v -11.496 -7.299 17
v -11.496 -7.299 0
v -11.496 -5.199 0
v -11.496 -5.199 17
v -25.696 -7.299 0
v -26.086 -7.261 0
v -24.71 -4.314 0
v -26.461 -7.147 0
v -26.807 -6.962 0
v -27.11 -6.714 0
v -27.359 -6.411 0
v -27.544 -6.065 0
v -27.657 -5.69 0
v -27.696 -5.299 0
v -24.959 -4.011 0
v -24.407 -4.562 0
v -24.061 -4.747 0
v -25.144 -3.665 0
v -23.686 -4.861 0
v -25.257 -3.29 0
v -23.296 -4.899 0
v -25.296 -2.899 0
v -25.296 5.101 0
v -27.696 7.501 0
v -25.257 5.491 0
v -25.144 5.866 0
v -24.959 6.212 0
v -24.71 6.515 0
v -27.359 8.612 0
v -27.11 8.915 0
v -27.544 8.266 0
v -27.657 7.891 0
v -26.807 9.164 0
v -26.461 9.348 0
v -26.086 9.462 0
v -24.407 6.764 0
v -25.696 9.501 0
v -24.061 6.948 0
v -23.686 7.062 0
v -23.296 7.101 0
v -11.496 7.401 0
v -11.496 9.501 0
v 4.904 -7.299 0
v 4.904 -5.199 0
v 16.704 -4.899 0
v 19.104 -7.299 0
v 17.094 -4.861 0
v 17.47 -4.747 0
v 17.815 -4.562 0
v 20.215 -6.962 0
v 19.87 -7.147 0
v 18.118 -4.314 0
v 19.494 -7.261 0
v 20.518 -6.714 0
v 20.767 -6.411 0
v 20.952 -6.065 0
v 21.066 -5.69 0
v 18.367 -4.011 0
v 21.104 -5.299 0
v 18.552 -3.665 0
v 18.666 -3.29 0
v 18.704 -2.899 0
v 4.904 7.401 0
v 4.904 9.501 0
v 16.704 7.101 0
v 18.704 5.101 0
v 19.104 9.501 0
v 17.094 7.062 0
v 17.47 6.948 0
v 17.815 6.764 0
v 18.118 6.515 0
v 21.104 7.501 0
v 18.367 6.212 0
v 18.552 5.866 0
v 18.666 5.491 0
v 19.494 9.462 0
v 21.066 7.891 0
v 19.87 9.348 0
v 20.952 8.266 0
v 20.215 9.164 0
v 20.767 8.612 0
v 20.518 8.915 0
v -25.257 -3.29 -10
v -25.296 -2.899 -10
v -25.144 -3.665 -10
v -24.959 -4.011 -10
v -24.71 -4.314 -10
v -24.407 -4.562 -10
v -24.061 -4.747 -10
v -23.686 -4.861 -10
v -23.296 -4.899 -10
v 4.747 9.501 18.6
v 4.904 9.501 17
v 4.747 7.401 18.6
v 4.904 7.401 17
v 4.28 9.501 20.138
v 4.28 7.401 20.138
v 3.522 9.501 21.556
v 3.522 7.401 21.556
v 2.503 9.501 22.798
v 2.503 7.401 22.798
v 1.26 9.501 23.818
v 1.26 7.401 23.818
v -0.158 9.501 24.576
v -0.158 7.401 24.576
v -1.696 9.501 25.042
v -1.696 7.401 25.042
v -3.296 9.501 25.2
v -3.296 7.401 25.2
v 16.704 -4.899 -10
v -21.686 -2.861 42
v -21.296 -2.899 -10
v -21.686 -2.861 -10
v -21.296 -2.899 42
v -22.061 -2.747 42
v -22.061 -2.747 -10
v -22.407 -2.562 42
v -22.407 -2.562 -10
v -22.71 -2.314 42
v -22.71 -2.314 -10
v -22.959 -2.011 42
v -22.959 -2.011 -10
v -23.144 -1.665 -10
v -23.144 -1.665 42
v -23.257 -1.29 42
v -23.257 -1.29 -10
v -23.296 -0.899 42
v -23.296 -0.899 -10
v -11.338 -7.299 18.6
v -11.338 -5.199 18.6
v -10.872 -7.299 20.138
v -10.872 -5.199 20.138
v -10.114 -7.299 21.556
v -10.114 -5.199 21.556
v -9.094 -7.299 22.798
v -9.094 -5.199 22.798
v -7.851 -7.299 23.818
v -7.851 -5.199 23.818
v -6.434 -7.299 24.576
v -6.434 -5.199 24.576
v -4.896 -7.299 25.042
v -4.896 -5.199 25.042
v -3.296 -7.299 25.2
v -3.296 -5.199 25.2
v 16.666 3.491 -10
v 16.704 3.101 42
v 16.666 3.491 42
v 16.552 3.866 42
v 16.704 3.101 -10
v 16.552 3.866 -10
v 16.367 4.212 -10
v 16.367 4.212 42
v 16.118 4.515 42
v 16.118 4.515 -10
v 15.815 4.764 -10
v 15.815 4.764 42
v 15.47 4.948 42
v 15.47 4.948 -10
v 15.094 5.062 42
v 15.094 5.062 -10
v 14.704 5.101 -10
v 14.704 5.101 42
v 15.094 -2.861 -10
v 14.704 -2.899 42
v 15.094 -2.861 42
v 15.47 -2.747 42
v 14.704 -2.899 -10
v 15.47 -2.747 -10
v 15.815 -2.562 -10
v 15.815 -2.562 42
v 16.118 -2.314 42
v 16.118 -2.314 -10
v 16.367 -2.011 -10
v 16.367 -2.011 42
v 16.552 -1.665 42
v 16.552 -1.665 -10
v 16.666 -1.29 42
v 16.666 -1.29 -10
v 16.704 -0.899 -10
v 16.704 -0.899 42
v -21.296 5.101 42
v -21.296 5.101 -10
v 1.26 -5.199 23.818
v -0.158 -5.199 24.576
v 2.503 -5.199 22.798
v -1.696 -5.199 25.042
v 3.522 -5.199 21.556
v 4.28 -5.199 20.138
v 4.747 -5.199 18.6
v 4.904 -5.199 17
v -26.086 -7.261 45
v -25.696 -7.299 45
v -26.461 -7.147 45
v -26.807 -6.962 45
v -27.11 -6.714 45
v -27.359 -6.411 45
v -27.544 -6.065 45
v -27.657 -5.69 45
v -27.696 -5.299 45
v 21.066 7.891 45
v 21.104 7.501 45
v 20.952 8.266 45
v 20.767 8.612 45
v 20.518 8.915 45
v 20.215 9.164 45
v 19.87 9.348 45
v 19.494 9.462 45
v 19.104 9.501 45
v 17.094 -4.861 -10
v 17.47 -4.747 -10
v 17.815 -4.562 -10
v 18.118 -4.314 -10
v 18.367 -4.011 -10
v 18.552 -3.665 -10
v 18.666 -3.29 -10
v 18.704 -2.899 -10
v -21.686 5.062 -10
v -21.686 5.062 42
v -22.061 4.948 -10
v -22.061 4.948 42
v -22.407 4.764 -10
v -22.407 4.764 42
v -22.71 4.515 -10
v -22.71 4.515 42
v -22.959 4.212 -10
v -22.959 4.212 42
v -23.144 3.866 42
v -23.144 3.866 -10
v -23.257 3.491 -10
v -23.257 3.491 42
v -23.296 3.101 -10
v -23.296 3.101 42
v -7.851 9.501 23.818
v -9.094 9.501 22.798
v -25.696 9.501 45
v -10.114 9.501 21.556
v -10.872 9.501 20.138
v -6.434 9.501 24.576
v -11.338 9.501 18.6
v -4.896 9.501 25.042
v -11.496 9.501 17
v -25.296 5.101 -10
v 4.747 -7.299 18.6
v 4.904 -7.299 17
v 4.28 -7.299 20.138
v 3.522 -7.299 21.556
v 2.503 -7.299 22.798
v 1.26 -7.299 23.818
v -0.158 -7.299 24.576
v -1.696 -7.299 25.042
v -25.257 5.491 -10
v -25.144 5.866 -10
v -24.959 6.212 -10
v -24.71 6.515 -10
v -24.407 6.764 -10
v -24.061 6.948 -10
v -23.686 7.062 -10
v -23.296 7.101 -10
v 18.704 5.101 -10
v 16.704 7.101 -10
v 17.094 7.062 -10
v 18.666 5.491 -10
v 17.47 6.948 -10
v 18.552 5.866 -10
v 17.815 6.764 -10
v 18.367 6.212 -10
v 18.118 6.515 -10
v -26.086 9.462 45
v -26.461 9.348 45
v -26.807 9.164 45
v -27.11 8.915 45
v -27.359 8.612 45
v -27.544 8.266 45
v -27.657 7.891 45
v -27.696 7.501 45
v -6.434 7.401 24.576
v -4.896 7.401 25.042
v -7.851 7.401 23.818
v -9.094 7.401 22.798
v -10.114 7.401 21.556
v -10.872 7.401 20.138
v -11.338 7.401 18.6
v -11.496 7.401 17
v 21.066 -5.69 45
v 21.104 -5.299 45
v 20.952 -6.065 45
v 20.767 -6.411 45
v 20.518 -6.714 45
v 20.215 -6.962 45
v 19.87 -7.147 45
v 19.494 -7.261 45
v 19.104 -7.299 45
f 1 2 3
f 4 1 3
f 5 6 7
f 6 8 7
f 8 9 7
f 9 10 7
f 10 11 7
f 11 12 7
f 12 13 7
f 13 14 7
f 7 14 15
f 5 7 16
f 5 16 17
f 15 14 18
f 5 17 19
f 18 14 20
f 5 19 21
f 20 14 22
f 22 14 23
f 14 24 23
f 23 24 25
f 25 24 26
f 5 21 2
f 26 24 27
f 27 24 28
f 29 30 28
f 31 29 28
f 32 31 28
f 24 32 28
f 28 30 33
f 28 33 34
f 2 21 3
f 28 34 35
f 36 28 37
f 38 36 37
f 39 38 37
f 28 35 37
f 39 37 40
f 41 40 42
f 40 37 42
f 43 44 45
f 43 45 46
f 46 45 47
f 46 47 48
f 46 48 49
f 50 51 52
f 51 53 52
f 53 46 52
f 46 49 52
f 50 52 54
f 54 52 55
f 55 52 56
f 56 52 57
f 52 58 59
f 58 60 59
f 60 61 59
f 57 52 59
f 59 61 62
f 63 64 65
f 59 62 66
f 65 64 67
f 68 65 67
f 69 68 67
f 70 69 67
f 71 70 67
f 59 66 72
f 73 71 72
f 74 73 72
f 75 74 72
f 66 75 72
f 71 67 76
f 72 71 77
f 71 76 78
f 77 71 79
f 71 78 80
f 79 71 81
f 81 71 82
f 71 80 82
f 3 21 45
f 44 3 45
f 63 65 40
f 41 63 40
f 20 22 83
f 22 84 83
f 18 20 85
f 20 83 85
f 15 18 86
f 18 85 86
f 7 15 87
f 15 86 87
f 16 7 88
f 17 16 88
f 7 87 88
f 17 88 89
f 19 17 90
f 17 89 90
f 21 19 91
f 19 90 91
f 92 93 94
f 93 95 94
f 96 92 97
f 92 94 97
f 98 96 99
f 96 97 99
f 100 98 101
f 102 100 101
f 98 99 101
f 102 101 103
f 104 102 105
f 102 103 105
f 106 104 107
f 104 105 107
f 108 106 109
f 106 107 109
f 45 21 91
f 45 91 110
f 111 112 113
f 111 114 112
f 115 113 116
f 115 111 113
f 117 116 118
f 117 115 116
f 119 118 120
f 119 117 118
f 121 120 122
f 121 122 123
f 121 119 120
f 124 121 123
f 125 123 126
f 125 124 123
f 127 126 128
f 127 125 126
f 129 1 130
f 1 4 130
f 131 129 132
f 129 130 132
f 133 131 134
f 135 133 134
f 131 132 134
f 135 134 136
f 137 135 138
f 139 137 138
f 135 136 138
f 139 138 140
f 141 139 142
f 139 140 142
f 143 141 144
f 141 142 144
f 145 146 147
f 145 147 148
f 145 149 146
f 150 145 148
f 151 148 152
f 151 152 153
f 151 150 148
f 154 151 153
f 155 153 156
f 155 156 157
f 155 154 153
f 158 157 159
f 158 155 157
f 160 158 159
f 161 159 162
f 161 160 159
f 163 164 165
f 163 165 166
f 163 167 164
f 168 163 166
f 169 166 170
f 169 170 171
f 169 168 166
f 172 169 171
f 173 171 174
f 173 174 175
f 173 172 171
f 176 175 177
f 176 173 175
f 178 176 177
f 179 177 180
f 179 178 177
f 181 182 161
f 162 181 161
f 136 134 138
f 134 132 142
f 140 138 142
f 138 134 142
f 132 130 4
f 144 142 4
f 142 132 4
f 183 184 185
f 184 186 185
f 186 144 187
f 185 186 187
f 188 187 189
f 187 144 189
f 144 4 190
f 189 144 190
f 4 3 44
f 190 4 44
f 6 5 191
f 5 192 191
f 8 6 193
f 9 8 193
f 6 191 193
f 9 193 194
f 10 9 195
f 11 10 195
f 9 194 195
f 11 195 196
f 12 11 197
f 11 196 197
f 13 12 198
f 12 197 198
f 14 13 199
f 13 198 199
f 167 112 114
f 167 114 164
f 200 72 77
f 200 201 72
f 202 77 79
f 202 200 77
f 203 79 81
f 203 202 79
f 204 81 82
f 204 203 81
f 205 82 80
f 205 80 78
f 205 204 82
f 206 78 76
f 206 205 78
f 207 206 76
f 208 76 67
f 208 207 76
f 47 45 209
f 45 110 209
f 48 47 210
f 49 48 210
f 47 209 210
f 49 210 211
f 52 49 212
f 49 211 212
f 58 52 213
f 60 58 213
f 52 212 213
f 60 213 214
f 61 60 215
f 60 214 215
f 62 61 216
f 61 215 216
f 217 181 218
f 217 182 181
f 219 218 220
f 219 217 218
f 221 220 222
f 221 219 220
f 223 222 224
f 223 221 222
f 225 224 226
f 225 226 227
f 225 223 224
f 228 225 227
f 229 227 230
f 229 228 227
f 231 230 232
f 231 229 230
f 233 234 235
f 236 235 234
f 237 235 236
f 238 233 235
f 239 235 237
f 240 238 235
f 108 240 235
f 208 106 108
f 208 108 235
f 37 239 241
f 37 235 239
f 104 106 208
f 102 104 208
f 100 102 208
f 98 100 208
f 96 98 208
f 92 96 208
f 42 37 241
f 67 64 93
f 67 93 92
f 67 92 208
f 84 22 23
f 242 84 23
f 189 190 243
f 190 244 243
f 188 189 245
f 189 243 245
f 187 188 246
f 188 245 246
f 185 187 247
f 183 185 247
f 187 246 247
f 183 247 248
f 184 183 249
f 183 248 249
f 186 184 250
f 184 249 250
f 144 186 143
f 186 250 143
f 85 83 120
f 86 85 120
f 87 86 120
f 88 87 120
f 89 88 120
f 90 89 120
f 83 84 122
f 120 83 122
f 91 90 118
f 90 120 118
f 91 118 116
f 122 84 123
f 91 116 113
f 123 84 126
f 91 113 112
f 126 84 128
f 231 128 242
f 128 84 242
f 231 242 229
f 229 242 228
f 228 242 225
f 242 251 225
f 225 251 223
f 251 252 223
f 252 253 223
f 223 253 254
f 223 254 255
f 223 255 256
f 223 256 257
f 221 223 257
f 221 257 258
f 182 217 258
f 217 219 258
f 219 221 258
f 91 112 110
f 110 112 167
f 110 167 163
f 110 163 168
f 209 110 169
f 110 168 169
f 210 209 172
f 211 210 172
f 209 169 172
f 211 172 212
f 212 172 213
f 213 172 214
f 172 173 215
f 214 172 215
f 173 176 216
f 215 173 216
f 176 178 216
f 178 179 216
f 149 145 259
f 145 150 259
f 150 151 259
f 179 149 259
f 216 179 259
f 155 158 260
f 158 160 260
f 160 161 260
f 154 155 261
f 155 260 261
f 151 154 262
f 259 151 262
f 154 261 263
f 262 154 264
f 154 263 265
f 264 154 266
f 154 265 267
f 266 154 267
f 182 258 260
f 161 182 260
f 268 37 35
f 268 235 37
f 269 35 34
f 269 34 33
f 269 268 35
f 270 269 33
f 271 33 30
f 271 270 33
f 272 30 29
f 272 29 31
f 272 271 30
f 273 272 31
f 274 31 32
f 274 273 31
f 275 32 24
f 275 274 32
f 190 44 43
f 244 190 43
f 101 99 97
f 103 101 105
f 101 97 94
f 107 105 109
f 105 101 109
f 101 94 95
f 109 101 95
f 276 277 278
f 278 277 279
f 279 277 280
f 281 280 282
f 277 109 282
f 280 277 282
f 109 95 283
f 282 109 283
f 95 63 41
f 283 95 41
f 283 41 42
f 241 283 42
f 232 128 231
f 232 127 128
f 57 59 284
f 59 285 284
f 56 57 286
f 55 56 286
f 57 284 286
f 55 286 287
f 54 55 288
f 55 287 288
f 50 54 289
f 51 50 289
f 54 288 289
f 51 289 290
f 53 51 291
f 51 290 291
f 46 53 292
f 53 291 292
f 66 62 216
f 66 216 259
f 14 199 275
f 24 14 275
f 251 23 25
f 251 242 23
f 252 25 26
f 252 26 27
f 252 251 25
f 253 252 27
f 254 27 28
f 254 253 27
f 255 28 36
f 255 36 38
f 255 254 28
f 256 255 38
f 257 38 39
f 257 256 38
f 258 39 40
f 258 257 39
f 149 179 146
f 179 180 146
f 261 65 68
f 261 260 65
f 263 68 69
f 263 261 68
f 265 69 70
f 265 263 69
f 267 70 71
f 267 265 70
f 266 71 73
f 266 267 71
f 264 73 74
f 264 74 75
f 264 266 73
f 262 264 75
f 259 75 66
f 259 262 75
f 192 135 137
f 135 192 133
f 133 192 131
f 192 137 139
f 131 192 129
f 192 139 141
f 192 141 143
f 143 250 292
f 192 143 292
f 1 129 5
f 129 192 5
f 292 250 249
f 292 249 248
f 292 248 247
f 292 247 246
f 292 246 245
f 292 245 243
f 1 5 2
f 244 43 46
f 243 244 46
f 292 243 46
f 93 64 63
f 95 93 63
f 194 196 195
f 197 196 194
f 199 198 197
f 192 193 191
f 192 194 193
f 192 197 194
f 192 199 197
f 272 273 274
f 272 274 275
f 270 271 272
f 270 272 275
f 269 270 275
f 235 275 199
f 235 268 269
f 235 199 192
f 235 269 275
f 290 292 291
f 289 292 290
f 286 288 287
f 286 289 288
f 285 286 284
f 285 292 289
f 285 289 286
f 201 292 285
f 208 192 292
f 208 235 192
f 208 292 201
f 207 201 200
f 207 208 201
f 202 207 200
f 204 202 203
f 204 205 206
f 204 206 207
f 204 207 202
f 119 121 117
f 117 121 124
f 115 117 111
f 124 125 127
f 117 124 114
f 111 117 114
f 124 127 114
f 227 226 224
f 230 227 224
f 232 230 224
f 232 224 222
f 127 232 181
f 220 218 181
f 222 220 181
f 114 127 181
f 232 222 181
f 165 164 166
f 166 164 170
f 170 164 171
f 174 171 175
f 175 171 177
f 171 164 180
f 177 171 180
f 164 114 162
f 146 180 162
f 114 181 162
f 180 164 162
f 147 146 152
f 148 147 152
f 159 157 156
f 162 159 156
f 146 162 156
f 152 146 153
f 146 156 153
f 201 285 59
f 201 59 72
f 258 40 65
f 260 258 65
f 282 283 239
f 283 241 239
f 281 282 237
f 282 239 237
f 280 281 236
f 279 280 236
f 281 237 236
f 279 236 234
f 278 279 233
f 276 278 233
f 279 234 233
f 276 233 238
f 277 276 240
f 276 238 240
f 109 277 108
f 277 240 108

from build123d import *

# Parameters (mm, degrees)
F0_W     = 48.799998641
F0_H     = 16.799998641
F0_W_2   = 44.799998641
F0_H_2   = 12.799998641
F0_W_3   = 44
F0_H_3   = 12
F0_W_4   = 40
F0_H_4   = 8
F1_DEPTH = 45
F2_DEPTH = 42
F3_DEPTH = 10
F4_R     = 2
F5_R     = 2
F6_R     = 2
F8_DEPTH = 25.2
F9_R     = 8.19999


# Not quite as in the source:
# - a fillet or chamfer is up to 0.001 mm smaller than in the source, because OpenCascade refuses the exact size


with BuildPart() as f1:
    # F0 (on Top) → F1 (new body)
    with BuildSketch(Plane.XY):
        with Locations((-3.2957775742, 1.1005828176)):
            Rectangle(F0_W, F0_H)
        with Locations((-3.2957775742, 1.1005828176)):
            Rectangle(F0_W_2, F0_H_2, mode=Mode.SUBTRACT)
        with Locations((-3.2957775742, 1.1005828176)):
            Rectangle(F0_W_2, F0_H_2)
        with Locations((-3.2957775742, 1.1005828176)):
            Rectangle(F0_W_3, F0_H_3, mode=Mode.SUBTRACT)
        with Locations((-3.2957775742, 1.1005828176)):
            Rectangle(F0_W_3, F0_H_3)
        with Locations((-3.2957775742, 1.1005828176)):
            Rectangle(F0_W_4, F0_H_4, mode=Mode.SUBTRACT)
        with Locations((-3.2957775742, 1.1005828176)):
            Rectangle(F0_W_4, F0_H_4)
    extrude(amount=F1_DEPTH)

    # F0 (on Top) → F2 (cut)
    with BuildSketch(Plane.XY):
        with Locations((-3.2957775742, 1.1005828176)):
            Rectangle(F0_W_4, F0_H_4)
    extrude(amount=F2_DEPTH, mode=Mode.SUBTRACT)

    # F0 (on Top) → F3 (join)
    with BuildSketch(Plane.XY):
        with Locations((-3.2957775742, 1.1005828176)):
            Rectangle(F0_W_3, F0_H_3)
        with Locations((-3.2957775742, 1.1005828176)):
            Rectangle(F0_W_4, F0_H_4, mode=Mode.SUBTRACT)
    extrude(amount=-F3_DEPTH)

    # F4
    f4_edges = [f1.edges().sort_by_distance(p)[0] for p in [
        (-27.695777, -7.299417, 22.5),
        (-27.695777, 9.500582, 22.5),
        (21.104222, -7.299417, 22.5),
        (21.104222, 9.500582, 22.5),
    ]]
    fillet(f4_edges, radius=F4_R)

    # F5
    f5_edges = [f1.edges().sort_by_distance(p)[0] for p in [
        (-23.295778, 5.100583, 16),
        (-23.295778, -2.899417, 16),
        (16.704222, 5.100583, 16),
        (16.704222, -2.899417, 16),
    ]]
    fillet(f5_edges, radius=F5_R)

    # F6
    f6_edges = [f1.edges().sort_by_distance(p)[0] for p in [
        (18.704222, -4.899417, -5),
        (18.704222, 7.100583, -5),
        (-25.295778, -4.899417, -5),
        (-25.295778, 7.100583, -5),
    ]]
    fillet(f6_edges, radius=F6_R)

    # F7 (on face) → F8 (cut)
    with BuildSketch(Plane(origin=(0, 0, 0), x_dir=(1, 0, 0), z_dir=(0, 0, -1))):
        Polygon((4.9042224258, 7.2994165029), (-3.2957775742, 7.2994165029), (-11.4957775742, 7.2994165029), (-11.4957775742, 5.1994165029), (4.9042224258, 5.1994165029), align=None)
        Polygon((-3.2957775742, -9.5005821381), (4.9042224258, -9.5005821381), (4.9042224258, -7.4005821381), (-11.4957775742, -7.4005821381), (-11.4957775742, -9.5005821381), align=None)
    extrude(amount=-F8_DEPTH, mode=Mode.SUBTRACT)

    # F9 (radius 8.2 in the source; OpenCascade refuses exactly that, so slightly less here)
    f9_edges = [f1.edges().sort_by_distance(p)[0] for p in [
        (-11.495778, -6.249417, 25.2),
        (4.904222, -6.249417, 25.2),
        (4.904222, 8.450582, 25.2),
        (-11.495778, 8.450582, 25.2),
    ]]
    fillet(f9_edges, radius=F9_R)


solid = f1.part
